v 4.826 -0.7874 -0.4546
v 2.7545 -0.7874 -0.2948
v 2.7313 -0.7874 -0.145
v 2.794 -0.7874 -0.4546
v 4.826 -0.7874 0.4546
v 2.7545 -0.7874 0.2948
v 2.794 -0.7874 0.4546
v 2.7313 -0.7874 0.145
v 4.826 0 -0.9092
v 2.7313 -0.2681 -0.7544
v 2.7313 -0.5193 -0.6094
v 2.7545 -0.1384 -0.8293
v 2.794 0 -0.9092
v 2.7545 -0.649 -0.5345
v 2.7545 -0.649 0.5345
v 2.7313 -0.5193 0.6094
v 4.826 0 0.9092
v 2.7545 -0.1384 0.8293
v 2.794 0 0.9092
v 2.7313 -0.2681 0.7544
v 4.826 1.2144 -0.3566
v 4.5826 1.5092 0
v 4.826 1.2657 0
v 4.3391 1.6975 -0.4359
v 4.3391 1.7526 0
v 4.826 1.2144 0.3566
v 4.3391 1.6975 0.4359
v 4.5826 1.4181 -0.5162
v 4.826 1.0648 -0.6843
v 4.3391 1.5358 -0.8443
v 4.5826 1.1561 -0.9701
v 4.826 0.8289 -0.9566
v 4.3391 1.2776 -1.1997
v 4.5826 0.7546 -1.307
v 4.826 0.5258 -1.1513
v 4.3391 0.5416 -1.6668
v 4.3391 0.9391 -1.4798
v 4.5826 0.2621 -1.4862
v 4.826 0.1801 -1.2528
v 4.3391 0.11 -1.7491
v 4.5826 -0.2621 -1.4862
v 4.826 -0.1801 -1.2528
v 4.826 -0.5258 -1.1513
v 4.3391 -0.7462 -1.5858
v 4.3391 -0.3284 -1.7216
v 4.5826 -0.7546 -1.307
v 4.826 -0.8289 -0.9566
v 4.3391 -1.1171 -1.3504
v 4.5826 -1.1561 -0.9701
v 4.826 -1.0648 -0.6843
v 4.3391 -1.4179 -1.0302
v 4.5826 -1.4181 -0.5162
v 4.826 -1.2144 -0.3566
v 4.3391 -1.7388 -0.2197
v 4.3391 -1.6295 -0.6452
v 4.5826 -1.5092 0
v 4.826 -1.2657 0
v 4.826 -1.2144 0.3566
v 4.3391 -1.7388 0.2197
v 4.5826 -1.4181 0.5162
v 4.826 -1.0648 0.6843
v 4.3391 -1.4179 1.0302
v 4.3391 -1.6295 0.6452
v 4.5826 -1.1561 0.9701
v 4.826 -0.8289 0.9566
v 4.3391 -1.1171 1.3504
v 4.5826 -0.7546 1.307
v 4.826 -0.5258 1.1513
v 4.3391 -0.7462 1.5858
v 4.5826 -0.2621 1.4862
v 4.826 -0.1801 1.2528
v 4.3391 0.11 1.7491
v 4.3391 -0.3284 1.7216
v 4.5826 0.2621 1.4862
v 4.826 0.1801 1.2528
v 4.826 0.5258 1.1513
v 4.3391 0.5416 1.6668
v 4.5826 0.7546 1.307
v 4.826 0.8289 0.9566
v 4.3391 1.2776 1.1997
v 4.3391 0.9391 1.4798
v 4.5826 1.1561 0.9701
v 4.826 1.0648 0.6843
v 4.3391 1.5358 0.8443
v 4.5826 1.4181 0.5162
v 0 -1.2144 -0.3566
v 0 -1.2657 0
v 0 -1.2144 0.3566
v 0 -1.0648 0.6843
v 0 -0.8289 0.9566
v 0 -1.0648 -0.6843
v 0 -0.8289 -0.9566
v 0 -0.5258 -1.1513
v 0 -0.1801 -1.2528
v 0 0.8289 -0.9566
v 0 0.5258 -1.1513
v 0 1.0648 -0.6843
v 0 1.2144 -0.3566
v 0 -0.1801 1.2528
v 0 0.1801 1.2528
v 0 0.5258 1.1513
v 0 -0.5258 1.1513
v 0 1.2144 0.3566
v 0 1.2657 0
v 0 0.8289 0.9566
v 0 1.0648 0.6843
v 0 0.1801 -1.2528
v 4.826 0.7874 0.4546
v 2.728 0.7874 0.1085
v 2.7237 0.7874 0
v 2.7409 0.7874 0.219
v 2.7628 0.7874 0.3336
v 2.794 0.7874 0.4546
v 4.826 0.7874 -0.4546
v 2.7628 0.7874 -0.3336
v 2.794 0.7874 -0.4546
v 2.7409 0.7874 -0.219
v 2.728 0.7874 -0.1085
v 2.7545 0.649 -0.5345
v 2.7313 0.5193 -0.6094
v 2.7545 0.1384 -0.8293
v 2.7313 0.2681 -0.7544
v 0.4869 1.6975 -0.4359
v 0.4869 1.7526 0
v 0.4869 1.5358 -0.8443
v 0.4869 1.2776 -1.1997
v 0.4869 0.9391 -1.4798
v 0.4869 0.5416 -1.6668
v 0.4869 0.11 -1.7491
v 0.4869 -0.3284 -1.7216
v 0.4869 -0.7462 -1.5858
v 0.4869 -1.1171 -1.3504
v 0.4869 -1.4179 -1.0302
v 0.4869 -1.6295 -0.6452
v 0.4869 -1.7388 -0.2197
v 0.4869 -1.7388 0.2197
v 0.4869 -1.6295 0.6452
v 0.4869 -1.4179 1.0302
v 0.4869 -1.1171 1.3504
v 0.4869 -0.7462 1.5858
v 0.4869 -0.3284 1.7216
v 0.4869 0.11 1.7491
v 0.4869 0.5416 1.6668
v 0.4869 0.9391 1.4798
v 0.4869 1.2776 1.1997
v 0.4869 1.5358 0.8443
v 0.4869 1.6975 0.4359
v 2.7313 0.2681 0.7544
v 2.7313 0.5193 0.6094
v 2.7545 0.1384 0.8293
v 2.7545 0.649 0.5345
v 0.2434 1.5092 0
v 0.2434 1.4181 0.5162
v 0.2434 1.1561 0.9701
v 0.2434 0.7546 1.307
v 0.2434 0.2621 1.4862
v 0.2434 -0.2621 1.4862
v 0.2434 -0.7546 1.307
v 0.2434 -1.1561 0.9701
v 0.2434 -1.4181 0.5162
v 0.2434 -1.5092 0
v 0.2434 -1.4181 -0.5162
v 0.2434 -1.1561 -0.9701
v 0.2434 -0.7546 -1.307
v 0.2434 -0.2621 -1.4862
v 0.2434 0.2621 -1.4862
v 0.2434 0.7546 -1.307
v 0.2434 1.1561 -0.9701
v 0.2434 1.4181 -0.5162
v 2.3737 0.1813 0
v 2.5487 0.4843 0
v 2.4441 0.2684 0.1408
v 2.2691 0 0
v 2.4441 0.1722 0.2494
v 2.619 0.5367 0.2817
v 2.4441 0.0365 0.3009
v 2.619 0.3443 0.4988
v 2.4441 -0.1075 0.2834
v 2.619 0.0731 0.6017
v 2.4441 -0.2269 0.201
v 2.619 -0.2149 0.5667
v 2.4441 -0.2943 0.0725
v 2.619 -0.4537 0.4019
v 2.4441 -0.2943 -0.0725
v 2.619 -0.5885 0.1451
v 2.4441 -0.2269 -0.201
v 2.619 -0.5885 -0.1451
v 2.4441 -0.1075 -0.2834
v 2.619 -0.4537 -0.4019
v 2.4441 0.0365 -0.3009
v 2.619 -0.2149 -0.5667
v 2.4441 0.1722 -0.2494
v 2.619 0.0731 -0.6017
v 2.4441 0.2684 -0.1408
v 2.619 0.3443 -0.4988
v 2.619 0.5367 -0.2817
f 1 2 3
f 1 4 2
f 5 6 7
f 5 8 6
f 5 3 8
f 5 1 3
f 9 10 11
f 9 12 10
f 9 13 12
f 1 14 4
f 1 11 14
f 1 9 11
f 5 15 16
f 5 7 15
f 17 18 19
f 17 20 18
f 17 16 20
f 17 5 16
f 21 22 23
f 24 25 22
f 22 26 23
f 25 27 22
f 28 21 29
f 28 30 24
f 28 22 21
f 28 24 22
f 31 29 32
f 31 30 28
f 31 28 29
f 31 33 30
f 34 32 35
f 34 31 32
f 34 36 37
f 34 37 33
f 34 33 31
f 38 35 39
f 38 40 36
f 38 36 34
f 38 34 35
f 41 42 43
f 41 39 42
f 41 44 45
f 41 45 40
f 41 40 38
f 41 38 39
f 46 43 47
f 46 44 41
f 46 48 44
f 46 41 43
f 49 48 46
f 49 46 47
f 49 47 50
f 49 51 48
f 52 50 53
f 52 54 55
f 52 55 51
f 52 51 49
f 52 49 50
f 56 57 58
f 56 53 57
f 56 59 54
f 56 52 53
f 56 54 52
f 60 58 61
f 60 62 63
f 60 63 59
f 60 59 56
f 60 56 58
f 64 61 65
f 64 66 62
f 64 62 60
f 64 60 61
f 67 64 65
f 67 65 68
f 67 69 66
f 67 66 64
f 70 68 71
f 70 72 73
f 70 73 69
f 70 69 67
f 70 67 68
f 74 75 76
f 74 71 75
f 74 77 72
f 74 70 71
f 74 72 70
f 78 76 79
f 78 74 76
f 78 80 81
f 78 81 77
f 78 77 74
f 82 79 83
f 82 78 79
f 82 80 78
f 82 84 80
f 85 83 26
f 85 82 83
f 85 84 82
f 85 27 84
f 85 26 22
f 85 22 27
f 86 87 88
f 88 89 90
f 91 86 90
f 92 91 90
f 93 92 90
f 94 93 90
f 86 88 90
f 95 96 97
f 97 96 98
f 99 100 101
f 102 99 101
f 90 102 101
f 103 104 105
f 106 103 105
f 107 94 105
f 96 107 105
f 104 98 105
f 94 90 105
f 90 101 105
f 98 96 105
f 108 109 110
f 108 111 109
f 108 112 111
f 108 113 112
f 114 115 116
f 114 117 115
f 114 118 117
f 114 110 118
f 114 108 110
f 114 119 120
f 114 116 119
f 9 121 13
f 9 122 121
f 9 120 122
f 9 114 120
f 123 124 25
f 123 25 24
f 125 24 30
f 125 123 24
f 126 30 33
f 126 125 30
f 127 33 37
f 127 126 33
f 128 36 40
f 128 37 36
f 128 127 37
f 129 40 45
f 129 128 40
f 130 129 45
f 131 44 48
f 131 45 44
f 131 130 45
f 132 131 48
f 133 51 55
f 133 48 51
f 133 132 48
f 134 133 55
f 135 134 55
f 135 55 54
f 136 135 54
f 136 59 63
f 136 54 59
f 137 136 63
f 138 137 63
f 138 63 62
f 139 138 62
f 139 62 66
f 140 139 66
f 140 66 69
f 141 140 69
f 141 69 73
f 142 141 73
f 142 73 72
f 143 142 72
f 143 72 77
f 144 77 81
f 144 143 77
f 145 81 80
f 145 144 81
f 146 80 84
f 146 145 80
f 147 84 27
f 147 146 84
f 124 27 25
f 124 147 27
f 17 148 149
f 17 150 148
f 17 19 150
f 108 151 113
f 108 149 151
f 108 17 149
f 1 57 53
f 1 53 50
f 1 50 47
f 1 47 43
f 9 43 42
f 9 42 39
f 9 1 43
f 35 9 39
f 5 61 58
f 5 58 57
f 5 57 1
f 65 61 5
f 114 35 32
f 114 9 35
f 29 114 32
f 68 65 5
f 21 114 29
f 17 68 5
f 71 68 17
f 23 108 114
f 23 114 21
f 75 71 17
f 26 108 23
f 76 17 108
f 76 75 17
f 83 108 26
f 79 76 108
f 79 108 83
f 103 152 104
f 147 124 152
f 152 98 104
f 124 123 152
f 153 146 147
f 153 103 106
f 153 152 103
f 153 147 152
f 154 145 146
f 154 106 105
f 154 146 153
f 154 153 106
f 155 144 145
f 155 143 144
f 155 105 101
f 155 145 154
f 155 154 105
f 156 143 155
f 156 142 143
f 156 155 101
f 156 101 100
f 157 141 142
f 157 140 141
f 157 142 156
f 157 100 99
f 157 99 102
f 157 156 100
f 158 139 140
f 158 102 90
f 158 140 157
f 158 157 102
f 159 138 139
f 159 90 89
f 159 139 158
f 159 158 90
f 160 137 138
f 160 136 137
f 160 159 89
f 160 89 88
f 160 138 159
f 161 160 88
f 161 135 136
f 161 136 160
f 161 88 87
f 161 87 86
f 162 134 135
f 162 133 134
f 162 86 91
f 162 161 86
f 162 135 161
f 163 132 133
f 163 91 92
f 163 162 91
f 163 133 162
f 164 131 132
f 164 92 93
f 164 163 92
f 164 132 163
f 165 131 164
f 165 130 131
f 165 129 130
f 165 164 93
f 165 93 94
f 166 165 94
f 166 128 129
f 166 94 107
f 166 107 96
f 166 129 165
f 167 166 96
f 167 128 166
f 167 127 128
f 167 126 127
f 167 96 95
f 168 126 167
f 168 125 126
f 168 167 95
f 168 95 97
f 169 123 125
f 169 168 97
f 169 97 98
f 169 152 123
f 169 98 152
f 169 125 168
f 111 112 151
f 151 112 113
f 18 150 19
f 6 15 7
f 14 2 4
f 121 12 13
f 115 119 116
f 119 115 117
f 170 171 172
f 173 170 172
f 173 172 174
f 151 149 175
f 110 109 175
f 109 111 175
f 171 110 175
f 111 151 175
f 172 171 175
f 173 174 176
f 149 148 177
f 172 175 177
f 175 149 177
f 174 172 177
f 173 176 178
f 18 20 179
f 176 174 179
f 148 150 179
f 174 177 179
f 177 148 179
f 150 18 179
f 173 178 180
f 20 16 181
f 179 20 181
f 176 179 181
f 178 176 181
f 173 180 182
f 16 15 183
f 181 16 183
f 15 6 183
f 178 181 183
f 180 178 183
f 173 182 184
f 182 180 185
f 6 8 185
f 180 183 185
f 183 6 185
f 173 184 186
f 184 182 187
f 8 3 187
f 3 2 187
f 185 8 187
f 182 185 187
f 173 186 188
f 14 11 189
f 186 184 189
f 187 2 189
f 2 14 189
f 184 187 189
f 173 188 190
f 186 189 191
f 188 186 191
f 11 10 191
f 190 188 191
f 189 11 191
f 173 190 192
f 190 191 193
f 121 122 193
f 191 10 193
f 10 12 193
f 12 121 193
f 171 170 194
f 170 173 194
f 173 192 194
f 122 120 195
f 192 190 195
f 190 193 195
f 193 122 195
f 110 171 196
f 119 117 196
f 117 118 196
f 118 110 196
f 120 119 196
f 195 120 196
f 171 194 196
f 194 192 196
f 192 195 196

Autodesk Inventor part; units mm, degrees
ref_plane "YZ Plane" through (0, 0, 0) normal (1, 0, 0) x (0, 1, 0)
ref_plane "XZ Plane" through (0, 0, 0) normal (0, 1, 0) x (-1, 0, 0)
sketch "Sketch1" plane through (0, 0, 0) normal (0, 0, 1) x (1, 0, 0)
  line L0 (0, 0) -> (2.2691, 0)
  line L1 (4.826, 0.9092) -> (4.826, 1.7526)
  line L2 (4.826, 1.7526) -> (0, 1.7526)
  line L3 (4.826, 0.9092) -> (2.794, 0.9092)
  line L4 (2.794, 0.9092) -> (2.2691, 0)
  line L5 (0, -0.3505) -> (0, 2.1031) projected
  line L6 (0, 1.7526) -> (0, 0)
  dimension "d0" = 2.032
  dimension "d1" = 60
  dimension "d2" = 3.5052
  dimension "d3" = 1.8184
  dimension "d5" = 4.826
revolve "Body" add sketch "Sketch1" angle 360 about axis through (0, 0, 0) along (1, 0, 0)
chamfer "Chamfer1" distance 0.4869 angle 45 1 edges at (4.826, -1.7526, 0) measured on face at (4.826, 1.4545, -0.1398)
sketch "Sketch2" plane through (4.826, 0, 0) normal (1, 0, 0) x (0, 0, -1)
  circle A0 centre (0, 0) radius 0.9092 projected
  line L0 (-0.4546, 0.7874) -> (0.4546, 0.7874)
  line L1 (0.4546, 0.7874) -> (0.9092, 0)
  line L2 (0.9092, 0) -> (0.4546, -0.7874)
  line L3 (0.4546, -0.7874) -> (-0.4546, -0.7874)
  line L4 (-0.4546, -0.7874) -> (-0.9092, 0)
  line L5 (-0.9092, 0) -> (-0.4546, 0.7874)
  point P0 (0, 0)
  point P1 (0, 0)
extrude "Slot" add sketch "Sketch2" against normal up to next contours L1 A0 | A0 L2 | L0 A0 | A0 L3 | L5 A0 | A0 L4
thread "Thread" size "6-32 UNC" class "2A" standard "ANSI Unified Screw Threads" length 4.826
chamfer "Chamfer2" distance 0.4869 angle 45 1 edges at (0, -1.7526, 0) measured on face at (1.4464, 1.7469, -0.141)
ref_plane "Work Plane1" through (2.413, 0, 0) normal (0, 0.5, 0.866) x (1, 0, 0)
equation "\"d7\" = -0.5 * GD1 + 0.5 * NND"
equation "\"d8\" = FAWI"
equation "\"d29\" = -0.5 * GD1 + 0.5 * NND"
equation "\"d11\" = NLG"
equation "\"d13\" = -0.5 * GD1 + 0.5 * NND"
equation "\"d14\" = FAWI"
equation "\"d30\" = -0.5 * GD1 + 0.5 * NND"
equation "\"d0\" = INTI"
equation "\"d2\" = NND"
equation "\"d3\" = 1.1547 * SW"
equation "\"d5\" = NLG"
equation "\"NND\" = 3.5052"
equation "\"NLG\" = 4.826"
equation "\"INTI\" = 2.032"
equation "\"FAWI\" = 45deg"
equation "\"SW\" = 1.5748"
equation "\"GD1\" = 2.53137"
equation "\"FAWI1\" = FAWI"
equation "\"SPD\" = 1.8796"
equation "\"SEWI\" = 90deg"
equation "\"TOA\" = 30deg"
equation "\"ZLG\" = 0.9652"
equation "\"ZD\" = 2.3368"
equation "\"HHPTC\" = 0.79375"
equation "\"THREADDIA\" = 3.5052"
equation "\"OPR\" = 2.6416"
equation "\"E0\" = 1.155 * SW"
properties part number "ANSI B18.3 - 6-32 UNC x 0.19" material "Steel, Mild"
